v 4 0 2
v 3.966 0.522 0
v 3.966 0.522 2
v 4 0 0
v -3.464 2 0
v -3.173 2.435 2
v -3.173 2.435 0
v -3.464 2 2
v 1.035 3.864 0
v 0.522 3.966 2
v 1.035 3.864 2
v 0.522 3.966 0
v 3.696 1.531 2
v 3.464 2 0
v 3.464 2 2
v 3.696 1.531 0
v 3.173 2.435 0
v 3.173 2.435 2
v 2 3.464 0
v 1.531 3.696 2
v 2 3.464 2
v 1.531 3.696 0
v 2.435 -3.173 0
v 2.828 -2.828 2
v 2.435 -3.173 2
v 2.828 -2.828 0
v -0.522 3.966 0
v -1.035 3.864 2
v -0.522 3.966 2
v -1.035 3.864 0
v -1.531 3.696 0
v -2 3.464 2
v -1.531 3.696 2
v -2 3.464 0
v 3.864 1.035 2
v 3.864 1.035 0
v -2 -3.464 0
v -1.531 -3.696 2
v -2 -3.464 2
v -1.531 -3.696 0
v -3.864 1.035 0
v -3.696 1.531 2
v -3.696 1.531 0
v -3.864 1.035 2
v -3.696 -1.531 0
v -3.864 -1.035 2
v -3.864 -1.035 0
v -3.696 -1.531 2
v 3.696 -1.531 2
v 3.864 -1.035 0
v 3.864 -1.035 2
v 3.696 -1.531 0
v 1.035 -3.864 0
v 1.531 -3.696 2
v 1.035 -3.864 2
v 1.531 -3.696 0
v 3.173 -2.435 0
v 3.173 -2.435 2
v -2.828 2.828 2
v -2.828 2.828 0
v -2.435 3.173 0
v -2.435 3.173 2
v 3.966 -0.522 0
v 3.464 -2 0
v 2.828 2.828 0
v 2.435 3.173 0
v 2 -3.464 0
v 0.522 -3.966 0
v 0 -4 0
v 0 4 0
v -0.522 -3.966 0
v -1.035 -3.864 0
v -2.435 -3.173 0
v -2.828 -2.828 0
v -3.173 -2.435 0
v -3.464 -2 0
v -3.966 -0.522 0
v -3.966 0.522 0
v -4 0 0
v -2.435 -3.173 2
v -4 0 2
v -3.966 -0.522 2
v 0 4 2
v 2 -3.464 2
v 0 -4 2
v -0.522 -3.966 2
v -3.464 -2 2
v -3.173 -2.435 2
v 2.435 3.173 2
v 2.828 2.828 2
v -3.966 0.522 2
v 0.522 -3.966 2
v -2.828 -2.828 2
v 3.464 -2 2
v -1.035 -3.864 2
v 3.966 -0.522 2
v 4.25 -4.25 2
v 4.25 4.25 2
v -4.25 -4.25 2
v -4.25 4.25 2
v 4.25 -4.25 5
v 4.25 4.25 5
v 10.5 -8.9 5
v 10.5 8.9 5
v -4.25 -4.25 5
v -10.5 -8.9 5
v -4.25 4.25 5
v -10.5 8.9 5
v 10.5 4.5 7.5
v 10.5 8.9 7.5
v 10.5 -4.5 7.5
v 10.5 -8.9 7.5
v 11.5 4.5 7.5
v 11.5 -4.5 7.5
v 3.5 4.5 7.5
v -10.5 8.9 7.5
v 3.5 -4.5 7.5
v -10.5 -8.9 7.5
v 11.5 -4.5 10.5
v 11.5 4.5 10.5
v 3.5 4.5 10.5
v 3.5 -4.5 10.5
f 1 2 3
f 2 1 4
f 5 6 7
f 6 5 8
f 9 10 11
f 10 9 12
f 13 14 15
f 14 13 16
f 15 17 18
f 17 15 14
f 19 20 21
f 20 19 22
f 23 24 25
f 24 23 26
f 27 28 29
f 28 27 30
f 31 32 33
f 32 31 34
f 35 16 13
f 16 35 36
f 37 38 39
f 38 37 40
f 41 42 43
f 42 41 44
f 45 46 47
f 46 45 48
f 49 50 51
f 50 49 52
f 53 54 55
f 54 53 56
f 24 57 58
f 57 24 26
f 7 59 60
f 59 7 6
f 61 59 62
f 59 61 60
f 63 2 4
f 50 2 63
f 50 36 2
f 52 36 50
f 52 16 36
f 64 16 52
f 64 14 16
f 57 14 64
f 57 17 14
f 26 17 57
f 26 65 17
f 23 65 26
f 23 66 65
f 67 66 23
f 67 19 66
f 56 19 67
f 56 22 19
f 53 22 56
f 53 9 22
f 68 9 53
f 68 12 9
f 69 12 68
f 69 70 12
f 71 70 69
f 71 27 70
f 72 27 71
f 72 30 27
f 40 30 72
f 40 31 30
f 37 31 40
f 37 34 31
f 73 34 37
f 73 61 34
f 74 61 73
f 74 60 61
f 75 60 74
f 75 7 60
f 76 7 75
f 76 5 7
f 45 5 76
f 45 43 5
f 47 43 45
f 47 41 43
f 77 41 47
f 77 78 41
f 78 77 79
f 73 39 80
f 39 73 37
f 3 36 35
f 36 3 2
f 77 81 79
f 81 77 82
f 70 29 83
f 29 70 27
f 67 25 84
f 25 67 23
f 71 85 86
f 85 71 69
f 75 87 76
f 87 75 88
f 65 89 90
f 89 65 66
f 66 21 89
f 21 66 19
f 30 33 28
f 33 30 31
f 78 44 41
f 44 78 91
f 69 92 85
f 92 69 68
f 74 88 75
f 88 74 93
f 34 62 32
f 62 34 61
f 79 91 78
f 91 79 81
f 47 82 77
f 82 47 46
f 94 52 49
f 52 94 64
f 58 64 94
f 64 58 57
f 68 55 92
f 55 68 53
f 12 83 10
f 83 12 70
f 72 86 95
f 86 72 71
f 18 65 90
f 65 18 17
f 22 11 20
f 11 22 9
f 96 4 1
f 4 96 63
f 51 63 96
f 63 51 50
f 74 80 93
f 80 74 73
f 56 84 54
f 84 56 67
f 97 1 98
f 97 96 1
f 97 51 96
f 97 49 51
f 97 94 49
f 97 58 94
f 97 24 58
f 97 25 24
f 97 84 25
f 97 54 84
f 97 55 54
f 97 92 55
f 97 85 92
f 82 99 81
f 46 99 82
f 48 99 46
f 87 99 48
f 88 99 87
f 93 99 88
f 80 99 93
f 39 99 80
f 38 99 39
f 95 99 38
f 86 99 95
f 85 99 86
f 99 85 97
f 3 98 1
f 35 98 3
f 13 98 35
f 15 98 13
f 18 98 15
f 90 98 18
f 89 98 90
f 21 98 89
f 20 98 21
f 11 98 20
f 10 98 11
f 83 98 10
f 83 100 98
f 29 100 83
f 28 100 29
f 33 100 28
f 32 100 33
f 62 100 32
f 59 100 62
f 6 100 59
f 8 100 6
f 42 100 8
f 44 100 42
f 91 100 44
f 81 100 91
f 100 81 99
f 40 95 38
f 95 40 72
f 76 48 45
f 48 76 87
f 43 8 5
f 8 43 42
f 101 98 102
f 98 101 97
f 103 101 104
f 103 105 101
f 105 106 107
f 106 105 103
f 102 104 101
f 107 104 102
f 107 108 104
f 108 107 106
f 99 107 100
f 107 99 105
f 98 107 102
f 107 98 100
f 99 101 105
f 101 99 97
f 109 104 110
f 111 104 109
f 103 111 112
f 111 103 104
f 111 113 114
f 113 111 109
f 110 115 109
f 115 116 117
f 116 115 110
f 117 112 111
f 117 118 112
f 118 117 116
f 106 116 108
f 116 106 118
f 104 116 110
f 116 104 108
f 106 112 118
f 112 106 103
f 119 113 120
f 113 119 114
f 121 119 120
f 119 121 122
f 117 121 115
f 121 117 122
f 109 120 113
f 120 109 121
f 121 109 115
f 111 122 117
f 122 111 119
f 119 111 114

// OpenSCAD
// ============================================================================
// xiao_esp32s3_001.scad — Board XIAO ESP32-S3 Sense (MOCK THAM CHIẾU)
// ----------------------------------------------------------------------------
// Chỉ để bố trí lắp/hiển thị trong assembly — KHÔNG in, KHÔNG chi tiết linh kiện.
// Cảm biến OV3660 (KHÔNG phải OV2640 — memory camera-sensor).
//
// GỐC CỤC BỘ: tâm mặt dưới ỐNG KÍNH camera = [0,0,0], camera nhìn xuống −Z.
// PCB nằm phía trên (+Z).
// ============================================================================
include <../constants.scad>

module xiao_esp32s3() {
    lens_h    = 2.0;   // phần ống kính nhô
    cam_blk   = 8.5;   // khối module camera vuông
    cam_blk_h = 3.0;

    // Ống kính (nhìn xuống −Z, mặt dưới tại z=0)
    color(col_metal) cylinder(d = xiao_cam_d, h = lens_h, $fn = 48);
    // Khối module camera
    color([0.15, 0.15, 0.15])
        translate([-cam_blk/2, -cam_blk/2, lens_h])
            cube([cam_blk, cam_blk, cam_blk_h]);
    // PCB (camera ~giữa board; expansion board Sense — mock phẳng)
    color(col_pcb)
        translate([-xiao_l/2, -xiao_w/2, lens_h + cam_blk_h])
            cube([xiao_l, xiao_w, xiao_h]);
    // Khối USB-C gợi vị trí (đầu +X)
    color(col_metal)
        translate([xiao_l/2 - 7, -4.5, lens_h + cam_blk_h + xiao_h])
            cube([8, 9, 3]);
}

xiao_esp32s3();
